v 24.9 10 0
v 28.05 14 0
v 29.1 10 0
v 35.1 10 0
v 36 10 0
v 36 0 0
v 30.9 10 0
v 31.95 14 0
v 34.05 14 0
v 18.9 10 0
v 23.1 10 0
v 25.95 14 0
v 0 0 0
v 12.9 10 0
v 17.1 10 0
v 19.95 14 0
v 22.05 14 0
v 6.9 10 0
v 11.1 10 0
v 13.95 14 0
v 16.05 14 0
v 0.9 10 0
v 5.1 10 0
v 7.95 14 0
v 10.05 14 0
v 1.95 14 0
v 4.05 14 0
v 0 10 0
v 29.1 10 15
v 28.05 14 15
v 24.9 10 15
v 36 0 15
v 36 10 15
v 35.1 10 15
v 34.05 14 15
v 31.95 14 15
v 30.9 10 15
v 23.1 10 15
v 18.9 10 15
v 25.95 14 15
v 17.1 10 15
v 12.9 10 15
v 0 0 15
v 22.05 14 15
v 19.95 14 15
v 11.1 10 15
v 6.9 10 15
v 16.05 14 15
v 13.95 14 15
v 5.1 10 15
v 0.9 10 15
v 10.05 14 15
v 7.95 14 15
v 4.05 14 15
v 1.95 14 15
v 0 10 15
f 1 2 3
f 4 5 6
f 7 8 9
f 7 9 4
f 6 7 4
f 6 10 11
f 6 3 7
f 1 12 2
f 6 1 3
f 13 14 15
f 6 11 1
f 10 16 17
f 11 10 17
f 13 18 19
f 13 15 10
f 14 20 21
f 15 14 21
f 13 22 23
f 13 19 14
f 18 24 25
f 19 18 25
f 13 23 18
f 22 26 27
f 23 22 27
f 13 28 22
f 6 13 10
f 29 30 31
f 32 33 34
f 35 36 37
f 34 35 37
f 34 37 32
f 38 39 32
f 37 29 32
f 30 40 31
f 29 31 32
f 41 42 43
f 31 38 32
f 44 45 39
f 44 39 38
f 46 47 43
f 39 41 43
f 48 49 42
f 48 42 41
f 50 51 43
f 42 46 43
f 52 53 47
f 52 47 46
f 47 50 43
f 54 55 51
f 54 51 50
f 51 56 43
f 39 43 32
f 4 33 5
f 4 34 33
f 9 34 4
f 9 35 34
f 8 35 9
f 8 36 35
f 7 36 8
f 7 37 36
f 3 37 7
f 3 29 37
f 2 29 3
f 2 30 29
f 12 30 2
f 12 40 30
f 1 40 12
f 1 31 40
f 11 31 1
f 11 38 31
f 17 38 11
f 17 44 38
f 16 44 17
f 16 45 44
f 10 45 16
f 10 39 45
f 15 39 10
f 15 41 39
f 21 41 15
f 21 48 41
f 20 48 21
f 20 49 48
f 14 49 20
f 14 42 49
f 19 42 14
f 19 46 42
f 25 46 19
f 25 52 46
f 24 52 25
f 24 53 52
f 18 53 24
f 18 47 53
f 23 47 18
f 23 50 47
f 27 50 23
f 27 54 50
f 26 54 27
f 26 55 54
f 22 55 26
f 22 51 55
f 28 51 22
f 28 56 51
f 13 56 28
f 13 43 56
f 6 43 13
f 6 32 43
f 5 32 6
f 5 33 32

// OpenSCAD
$fn = 32;

// ----------------------------------------------------------------------
// Gear rack: 6 teeth, pitch 6 mm
// ----------------------------------------------------------------------

// --- parameters (mm) ---
teeth = 6;                // number of teeth
pitch = 6;                // tooth pitch, X
root_w = 4.2;             // tooth width at the root
tip_w = 2.1;              // tooth width at the tip
base_h = 10;              // rack body height, Y
tooth_h = 4;              // tooth height above the body
plate_t = 15;             // rack width, Z (extrusion height)

rack_l = teeth * pitch;  // overall length
total_h = base_h + tooth_h;  // overall height

profile = [[0, 0], [36, 0], [36, 10], [35.1, 10], [34.05, 14], [31.95, 14], [30.9, 10], [29.1, 10], [28.05, 14], [25.95, 14], [24.9, 10], [23.1, 10], [22.05, 14], [19.95, 14], [18.9, 10], [17.1, 10], [16.05, 14], [13.95, 14], [12.9, 10], [11.1, 10], [10.05, 14], [7.95, 14], [6.9, 10], [5.1, 10], [4.05, 14], [1.95, 14], [0.9, 10], [0, 10]];  // primary outline, 28 points, counter clockwise

// --- the one profile operation ---
linear_extrude(height = plate_t) polygon(points = profile);
